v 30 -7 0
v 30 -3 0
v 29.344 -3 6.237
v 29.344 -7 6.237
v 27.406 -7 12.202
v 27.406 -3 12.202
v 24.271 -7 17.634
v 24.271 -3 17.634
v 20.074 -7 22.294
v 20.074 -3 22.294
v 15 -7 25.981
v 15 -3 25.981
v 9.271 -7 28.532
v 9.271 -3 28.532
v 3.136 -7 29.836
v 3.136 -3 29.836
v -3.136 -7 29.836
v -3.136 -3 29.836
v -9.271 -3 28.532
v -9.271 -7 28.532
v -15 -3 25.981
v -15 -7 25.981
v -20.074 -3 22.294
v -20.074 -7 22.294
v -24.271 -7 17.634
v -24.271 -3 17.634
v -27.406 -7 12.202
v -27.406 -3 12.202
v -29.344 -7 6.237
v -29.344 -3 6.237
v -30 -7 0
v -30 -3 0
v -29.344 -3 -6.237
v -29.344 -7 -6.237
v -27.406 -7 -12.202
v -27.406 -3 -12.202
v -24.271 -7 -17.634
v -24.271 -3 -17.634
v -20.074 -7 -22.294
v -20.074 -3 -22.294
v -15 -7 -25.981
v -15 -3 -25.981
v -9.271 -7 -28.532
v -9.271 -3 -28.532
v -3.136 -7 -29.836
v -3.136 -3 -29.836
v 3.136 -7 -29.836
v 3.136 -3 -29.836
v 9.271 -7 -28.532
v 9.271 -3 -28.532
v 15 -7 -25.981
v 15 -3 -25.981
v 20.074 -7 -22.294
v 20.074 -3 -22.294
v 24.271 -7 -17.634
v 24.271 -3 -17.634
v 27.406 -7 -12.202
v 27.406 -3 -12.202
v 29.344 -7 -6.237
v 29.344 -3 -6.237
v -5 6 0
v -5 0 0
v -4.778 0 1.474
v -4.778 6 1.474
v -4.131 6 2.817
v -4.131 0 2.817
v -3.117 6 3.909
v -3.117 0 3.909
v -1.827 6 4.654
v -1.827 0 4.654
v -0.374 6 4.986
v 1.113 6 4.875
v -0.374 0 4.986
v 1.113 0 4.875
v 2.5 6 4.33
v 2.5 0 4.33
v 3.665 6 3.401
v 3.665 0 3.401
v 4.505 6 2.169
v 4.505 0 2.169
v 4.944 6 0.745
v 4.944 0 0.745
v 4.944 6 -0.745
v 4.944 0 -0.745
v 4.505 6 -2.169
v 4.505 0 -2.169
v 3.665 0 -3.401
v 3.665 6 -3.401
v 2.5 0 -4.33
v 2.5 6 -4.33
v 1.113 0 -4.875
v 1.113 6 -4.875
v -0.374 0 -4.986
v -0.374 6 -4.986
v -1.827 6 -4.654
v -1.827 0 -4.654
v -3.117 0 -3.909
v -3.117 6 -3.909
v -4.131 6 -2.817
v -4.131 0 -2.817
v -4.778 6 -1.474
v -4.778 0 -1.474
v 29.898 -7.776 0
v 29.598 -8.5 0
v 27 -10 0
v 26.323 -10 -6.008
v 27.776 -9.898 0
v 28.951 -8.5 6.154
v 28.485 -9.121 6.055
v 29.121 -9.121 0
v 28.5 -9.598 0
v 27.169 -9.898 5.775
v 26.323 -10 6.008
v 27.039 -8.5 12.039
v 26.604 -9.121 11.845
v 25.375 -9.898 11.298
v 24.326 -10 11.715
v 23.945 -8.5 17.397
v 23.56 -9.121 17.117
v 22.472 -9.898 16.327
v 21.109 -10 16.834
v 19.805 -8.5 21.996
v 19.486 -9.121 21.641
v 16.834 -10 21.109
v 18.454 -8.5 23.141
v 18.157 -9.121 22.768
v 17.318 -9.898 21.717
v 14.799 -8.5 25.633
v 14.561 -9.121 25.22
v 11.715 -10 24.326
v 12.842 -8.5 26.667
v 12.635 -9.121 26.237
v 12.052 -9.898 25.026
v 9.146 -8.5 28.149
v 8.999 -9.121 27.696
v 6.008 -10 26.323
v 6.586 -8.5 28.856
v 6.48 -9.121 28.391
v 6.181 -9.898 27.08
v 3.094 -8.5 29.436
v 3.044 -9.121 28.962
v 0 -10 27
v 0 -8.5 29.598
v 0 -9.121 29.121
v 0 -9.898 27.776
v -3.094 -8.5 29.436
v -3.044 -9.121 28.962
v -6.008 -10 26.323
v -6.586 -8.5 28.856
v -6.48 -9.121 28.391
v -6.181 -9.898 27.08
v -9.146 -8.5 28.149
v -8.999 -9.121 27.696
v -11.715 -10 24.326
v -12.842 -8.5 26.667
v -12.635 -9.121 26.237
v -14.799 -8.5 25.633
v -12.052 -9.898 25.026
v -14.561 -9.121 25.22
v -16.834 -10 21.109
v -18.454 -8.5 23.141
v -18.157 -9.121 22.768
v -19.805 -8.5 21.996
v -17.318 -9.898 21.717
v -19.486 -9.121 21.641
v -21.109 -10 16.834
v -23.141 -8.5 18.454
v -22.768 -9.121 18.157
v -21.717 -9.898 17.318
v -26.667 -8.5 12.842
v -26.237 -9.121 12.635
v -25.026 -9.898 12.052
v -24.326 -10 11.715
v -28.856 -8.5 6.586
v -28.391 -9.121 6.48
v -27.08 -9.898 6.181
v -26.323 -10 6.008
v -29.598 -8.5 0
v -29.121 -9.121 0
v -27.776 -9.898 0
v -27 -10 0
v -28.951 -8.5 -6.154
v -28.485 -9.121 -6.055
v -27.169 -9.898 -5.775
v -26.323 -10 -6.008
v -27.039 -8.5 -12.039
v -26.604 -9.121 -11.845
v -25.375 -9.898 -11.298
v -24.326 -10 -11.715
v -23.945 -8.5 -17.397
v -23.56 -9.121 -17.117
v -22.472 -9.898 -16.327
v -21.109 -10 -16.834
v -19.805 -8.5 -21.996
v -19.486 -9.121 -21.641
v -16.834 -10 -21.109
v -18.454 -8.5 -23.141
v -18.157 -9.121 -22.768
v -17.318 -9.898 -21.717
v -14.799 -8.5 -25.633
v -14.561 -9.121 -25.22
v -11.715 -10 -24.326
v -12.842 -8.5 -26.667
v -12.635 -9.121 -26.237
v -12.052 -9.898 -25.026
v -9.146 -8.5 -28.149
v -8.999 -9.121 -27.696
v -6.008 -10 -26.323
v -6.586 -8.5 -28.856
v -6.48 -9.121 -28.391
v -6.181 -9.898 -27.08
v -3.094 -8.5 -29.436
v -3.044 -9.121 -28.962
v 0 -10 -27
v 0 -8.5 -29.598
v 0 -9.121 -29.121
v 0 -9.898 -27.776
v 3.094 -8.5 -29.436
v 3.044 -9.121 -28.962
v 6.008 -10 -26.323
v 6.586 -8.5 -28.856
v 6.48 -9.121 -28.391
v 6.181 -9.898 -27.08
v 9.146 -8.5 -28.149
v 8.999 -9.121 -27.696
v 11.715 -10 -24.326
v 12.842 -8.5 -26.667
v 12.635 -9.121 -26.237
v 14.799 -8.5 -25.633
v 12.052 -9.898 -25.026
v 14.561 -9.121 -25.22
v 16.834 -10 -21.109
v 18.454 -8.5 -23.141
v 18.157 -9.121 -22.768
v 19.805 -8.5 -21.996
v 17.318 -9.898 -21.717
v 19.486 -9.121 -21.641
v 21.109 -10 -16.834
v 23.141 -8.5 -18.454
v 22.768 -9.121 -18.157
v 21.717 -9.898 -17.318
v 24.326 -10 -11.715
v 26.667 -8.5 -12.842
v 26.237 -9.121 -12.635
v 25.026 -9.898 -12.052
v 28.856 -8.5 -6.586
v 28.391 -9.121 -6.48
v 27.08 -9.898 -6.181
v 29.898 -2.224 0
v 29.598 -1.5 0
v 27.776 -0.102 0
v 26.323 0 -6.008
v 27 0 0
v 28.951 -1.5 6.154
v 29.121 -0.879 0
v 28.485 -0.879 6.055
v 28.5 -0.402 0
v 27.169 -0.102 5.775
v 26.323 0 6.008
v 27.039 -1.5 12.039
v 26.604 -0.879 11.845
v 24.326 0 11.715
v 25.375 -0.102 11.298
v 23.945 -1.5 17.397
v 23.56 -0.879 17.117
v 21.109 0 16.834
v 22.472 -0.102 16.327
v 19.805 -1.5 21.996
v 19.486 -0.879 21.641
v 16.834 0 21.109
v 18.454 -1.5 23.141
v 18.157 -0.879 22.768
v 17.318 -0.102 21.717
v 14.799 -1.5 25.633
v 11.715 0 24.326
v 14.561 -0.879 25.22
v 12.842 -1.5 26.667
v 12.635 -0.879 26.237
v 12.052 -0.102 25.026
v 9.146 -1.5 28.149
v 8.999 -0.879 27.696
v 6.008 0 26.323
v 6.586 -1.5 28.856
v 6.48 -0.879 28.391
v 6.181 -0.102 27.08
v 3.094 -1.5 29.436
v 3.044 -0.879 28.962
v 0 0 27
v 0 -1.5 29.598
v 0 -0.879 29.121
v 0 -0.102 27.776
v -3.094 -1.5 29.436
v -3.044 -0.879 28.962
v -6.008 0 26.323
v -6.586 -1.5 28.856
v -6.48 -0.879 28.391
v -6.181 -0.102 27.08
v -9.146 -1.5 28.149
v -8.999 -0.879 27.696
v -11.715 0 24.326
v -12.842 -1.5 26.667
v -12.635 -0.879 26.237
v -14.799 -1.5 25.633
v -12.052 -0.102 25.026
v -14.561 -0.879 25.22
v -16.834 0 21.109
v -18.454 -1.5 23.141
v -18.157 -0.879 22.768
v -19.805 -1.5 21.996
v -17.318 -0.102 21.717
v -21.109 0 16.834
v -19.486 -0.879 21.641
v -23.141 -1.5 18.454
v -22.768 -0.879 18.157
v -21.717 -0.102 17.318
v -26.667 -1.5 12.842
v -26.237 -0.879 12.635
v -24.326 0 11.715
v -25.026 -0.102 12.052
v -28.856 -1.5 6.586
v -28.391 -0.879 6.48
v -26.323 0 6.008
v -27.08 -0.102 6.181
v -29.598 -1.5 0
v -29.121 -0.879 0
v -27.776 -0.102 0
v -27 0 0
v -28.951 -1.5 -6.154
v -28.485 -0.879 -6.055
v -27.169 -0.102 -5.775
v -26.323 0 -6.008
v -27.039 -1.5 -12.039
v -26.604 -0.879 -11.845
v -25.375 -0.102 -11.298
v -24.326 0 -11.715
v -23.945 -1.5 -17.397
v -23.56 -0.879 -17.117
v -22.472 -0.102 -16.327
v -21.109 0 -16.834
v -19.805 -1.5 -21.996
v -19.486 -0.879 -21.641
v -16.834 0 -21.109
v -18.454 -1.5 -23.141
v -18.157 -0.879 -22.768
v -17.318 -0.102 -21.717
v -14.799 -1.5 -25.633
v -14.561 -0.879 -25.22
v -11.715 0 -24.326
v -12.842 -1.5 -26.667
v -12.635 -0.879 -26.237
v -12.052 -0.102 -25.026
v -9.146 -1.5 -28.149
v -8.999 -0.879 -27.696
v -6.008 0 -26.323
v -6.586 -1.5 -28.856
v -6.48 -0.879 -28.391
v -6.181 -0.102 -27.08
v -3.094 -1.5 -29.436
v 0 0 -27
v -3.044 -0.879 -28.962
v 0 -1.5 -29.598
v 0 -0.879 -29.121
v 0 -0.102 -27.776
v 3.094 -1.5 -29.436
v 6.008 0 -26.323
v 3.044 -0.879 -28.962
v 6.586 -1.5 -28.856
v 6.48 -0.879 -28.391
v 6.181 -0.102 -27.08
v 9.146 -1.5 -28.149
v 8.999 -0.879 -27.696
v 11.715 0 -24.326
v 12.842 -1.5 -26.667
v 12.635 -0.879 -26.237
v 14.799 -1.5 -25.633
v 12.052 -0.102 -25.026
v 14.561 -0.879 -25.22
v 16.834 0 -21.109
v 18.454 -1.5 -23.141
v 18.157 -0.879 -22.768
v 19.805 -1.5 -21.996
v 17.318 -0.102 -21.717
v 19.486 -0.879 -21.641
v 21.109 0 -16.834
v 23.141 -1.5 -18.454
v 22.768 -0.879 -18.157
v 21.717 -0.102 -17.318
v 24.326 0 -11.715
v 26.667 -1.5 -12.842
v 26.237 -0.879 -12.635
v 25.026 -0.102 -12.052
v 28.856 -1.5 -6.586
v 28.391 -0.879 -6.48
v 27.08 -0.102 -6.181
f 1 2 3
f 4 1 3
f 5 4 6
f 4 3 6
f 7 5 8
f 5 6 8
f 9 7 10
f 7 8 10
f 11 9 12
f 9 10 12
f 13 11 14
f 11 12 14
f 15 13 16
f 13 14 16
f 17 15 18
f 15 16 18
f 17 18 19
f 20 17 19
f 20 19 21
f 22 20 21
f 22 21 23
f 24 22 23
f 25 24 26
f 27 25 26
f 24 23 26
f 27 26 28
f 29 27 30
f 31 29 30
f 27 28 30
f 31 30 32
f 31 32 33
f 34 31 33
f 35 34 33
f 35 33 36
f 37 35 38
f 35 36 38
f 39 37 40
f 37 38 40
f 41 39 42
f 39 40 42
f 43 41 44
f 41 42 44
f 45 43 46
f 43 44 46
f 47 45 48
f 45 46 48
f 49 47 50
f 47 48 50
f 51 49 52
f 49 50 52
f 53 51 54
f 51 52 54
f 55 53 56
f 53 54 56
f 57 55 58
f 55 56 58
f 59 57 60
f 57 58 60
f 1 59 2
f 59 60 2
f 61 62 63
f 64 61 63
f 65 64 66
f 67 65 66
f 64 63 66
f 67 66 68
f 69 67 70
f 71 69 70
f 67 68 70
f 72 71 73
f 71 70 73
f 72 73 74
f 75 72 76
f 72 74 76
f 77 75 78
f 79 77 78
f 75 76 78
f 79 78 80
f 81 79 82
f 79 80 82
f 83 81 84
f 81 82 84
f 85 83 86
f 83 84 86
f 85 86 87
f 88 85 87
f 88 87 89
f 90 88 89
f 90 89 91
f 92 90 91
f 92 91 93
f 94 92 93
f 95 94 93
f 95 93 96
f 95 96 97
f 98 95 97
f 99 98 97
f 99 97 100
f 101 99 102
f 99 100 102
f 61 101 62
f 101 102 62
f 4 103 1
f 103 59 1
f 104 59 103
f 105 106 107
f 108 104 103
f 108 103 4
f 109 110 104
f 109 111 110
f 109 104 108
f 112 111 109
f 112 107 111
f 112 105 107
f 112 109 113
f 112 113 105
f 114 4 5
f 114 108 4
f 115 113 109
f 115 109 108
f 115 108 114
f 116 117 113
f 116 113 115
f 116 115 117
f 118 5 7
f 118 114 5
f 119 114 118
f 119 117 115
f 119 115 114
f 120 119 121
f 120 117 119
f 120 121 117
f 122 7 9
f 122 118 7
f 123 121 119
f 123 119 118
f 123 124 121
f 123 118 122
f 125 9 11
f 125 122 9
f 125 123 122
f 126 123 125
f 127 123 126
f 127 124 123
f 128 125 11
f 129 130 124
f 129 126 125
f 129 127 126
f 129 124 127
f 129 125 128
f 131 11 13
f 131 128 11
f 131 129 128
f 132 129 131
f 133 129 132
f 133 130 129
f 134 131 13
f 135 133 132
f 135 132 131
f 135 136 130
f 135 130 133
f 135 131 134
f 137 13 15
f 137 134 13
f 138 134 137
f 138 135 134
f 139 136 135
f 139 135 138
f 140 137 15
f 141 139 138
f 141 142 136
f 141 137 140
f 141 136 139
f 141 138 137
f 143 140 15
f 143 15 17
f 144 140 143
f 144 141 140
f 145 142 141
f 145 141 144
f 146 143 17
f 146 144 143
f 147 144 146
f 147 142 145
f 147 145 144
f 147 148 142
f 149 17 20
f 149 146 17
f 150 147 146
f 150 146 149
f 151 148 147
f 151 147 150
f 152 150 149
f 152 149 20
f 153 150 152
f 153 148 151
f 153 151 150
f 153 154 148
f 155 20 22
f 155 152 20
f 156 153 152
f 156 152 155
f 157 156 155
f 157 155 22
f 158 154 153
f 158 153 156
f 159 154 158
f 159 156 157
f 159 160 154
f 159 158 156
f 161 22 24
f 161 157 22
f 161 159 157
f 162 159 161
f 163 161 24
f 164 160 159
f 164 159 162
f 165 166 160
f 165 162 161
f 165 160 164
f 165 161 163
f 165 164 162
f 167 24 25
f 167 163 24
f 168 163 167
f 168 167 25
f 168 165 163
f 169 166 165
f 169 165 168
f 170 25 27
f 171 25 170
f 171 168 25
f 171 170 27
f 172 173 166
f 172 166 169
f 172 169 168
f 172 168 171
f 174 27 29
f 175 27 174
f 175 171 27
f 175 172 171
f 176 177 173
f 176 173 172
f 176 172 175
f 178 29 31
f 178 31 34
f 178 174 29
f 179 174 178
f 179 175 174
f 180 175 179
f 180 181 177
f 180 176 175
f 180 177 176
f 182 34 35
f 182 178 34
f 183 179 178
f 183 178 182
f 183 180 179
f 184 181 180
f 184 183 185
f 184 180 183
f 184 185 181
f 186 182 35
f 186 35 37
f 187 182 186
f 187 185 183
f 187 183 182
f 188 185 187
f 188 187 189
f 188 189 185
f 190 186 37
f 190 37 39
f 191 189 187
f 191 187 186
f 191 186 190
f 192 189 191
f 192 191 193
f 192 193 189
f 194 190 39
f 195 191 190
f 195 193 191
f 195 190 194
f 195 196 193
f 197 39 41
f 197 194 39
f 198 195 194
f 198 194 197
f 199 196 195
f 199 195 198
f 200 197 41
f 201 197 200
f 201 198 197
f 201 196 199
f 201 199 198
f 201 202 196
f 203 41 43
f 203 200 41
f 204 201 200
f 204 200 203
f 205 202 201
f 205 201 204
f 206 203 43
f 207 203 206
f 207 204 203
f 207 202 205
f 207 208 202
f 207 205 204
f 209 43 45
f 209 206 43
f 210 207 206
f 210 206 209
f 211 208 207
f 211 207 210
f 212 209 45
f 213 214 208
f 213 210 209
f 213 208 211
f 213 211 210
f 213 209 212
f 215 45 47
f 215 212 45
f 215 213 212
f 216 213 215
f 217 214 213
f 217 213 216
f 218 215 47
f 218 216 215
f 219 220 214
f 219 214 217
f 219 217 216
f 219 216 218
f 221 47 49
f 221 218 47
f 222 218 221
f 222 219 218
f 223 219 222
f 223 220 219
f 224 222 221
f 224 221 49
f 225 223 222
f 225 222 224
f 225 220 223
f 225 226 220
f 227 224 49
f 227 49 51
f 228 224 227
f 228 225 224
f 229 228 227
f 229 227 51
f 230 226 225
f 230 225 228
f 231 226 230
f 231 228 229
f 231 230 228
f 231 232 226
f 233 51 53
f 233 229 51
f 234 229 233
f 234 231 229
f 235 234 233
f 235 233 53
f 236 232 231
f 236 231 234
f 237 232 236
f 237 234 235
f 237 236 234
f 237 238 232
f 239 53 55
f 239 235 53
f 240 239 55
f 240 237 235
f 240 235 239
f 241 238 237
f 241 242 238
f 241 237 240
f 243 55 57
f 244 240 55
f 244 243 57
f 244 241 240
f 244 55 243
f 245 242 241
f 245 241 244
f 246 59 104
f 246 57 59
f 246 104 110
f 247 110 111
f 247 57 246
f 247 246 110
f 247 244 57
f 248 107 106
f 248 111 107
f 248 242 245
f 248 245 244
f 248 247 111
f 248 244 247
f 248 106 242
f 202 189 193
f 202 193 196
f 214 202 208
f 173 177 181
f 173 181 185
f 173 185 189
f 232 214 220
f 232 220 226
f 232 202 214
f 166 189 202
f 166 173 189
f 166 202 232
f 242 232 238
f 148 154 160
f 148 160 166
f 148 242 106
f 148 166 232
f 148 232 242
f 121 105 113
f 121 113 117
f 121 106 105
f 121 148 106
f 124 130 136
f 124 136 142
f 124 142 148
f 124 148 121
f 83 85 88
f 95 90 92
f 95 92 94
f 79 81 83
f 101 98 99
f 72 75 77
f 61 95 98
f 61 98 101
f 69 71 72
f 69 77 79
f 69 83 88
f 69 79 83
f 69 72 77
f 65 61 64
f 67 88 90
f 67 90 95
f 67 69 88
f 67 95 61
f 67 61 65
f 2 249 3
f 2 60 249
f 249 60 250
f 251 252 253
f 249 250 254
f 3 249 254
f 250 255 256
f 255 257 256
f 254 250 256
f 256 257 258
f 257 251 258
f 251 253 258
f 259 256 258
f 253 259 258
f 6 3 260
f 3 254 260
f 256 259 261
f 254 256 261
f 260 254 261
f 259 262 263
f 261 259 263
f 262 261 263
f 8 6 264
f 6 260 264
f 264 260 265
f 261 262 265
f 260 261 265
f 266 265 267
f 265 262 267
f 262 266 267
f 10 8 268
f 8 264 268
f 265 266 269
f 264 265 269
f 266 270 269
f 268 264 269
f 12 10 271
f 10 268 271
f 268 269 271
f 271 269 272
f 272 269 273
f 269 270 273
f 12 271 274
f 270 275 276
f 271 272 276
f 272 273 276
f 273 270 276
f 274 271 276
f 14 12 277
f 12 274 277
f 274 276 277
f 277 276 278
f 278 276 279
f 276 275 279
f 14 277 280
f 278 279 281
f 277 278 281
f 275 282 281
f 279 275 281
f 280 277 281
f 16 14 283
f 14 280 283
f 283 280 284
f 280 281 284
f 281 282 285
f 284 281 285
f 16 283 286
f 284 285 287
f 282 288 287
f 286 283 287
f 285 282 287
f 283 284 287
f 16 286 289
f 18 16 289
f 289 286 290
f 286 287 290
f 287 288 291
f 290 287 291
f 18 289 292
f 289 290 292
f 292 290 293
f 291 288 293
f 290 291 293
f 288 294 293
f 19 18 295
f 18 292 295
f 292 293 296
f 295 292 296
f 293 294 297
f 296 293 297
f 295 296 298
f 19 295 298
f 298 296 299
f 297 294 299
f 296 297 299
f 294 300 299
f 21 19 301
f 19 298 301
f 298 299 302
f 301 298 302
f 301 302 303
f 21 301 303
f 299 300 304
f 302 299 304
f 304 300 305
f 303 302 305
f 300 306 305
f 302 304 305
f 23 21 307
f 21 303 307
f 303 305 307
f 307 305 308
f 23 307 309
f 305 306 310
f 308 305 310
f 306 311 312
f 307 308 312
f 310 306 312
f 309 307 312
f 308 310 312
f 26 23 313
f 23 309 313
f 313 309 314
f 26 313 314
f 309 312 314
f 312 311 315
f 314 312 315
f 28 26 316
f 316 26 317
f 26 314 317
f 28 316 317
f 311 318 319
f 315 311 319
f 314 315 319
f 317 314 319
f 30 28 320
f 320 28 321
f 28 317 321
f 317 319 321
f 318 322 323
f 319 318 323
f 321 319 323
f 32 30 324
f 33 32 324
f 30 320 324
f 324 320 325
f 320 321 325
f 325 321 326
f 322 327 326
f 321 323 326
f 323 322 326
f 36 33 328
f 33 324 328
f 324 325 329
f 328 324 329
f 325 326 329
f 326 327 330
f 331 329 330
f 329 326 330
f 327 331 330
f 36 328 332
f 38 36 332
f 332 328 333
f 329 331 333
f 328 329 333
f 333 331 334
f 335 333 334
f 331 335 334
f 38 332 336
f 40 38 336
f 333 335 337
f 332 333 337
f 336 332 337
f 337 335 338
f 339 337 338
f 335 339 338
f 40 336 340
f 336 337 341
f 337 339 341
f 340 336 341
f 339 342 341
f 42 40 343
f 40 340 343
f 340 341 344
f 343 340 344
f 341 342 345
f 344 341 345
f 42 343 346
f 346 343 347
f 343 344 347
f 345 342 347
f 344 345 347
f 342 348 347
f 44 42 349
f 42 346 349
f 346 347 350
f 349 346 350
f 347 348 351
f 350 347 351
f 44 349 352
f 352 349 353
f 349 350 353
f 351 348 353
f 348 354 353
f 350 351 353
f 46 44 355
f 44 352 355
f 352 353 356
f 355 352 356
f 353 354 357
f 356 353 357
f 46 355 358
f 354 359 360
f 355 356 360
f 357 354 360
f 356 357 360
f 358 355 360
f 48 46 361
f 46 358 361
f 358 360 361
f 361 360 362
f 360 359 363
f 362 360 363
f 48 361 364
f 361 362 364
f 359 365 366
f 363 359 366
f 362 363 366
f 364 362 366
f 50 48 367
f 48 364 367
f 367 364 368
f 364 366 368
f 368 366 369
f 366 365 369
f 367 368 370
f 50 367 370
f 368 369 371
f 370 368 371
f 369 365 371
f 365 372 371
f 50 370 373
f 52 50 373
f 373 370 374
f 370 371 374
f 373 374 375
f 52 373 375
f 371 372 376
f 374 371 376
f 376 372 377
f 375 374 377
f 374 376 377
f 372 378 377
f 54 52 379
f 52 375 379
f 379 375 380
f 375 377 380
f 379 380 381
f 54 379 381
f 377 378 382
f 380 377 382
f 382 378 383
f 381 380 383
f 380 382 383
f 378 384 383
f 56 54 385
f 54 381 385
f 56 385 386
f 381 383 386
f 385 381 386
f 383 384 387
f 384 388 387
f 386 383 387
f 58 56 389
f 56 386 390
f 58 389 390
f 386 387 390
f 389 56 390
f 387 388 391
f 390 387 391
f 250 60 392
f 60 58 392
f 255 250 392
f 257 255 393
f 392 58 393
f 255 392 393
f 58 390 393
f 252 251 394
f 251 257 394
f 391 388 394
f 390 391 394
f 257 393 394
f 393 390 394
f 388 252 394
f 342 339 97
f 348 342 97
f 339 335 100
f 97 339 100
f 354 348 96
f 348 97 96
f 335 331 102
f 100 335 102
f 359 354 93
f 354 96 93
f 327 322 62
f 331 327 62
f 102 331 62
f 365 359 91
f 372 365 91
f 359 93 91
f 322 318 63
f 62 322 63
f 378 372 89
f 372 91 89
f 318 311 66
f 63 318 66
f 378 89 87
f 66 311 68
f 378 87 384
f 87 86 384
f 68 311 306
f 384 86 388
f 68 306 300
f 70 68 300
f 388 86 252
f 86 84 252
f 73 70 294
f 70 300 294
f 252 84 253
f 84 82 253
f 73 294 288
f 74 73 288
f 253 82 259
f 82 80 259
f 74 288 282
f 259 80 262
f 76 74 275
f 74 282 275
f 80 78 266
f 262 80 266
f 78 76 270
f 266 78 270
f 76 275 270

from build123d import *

# Parameters (mm, degrees)
F0_R     = 30
F1_DEPTH = 10
F2_R     = 3
F3_R     = 5
F4_DEPTH = 6


with BuildPart() as f1:
    # F0 (on Front) → F1 (new body)
    with BuildSketch(Plane.XZ):
        Circle(F0_R)
    extrude(amount=F1_DEPTH)

    # F2
    f2_edges = [f1.edges().sort_by_distance(p)[0] for p in [
        (-30, -10, 0),
        (-30, 0, 0),
    ]]
    fillet(f2_edges, radius=F2_R)

    # F3 (on face) → F4 (join)
    with BuildSketch(Plane(origin=(0, 0, 0), x_dir=(-1, 0, 0), z_dir=(0, 1, 0))):
        Circle(F3_R)
    extrude(amount=F4_DEPTH)


solid = f1.part
